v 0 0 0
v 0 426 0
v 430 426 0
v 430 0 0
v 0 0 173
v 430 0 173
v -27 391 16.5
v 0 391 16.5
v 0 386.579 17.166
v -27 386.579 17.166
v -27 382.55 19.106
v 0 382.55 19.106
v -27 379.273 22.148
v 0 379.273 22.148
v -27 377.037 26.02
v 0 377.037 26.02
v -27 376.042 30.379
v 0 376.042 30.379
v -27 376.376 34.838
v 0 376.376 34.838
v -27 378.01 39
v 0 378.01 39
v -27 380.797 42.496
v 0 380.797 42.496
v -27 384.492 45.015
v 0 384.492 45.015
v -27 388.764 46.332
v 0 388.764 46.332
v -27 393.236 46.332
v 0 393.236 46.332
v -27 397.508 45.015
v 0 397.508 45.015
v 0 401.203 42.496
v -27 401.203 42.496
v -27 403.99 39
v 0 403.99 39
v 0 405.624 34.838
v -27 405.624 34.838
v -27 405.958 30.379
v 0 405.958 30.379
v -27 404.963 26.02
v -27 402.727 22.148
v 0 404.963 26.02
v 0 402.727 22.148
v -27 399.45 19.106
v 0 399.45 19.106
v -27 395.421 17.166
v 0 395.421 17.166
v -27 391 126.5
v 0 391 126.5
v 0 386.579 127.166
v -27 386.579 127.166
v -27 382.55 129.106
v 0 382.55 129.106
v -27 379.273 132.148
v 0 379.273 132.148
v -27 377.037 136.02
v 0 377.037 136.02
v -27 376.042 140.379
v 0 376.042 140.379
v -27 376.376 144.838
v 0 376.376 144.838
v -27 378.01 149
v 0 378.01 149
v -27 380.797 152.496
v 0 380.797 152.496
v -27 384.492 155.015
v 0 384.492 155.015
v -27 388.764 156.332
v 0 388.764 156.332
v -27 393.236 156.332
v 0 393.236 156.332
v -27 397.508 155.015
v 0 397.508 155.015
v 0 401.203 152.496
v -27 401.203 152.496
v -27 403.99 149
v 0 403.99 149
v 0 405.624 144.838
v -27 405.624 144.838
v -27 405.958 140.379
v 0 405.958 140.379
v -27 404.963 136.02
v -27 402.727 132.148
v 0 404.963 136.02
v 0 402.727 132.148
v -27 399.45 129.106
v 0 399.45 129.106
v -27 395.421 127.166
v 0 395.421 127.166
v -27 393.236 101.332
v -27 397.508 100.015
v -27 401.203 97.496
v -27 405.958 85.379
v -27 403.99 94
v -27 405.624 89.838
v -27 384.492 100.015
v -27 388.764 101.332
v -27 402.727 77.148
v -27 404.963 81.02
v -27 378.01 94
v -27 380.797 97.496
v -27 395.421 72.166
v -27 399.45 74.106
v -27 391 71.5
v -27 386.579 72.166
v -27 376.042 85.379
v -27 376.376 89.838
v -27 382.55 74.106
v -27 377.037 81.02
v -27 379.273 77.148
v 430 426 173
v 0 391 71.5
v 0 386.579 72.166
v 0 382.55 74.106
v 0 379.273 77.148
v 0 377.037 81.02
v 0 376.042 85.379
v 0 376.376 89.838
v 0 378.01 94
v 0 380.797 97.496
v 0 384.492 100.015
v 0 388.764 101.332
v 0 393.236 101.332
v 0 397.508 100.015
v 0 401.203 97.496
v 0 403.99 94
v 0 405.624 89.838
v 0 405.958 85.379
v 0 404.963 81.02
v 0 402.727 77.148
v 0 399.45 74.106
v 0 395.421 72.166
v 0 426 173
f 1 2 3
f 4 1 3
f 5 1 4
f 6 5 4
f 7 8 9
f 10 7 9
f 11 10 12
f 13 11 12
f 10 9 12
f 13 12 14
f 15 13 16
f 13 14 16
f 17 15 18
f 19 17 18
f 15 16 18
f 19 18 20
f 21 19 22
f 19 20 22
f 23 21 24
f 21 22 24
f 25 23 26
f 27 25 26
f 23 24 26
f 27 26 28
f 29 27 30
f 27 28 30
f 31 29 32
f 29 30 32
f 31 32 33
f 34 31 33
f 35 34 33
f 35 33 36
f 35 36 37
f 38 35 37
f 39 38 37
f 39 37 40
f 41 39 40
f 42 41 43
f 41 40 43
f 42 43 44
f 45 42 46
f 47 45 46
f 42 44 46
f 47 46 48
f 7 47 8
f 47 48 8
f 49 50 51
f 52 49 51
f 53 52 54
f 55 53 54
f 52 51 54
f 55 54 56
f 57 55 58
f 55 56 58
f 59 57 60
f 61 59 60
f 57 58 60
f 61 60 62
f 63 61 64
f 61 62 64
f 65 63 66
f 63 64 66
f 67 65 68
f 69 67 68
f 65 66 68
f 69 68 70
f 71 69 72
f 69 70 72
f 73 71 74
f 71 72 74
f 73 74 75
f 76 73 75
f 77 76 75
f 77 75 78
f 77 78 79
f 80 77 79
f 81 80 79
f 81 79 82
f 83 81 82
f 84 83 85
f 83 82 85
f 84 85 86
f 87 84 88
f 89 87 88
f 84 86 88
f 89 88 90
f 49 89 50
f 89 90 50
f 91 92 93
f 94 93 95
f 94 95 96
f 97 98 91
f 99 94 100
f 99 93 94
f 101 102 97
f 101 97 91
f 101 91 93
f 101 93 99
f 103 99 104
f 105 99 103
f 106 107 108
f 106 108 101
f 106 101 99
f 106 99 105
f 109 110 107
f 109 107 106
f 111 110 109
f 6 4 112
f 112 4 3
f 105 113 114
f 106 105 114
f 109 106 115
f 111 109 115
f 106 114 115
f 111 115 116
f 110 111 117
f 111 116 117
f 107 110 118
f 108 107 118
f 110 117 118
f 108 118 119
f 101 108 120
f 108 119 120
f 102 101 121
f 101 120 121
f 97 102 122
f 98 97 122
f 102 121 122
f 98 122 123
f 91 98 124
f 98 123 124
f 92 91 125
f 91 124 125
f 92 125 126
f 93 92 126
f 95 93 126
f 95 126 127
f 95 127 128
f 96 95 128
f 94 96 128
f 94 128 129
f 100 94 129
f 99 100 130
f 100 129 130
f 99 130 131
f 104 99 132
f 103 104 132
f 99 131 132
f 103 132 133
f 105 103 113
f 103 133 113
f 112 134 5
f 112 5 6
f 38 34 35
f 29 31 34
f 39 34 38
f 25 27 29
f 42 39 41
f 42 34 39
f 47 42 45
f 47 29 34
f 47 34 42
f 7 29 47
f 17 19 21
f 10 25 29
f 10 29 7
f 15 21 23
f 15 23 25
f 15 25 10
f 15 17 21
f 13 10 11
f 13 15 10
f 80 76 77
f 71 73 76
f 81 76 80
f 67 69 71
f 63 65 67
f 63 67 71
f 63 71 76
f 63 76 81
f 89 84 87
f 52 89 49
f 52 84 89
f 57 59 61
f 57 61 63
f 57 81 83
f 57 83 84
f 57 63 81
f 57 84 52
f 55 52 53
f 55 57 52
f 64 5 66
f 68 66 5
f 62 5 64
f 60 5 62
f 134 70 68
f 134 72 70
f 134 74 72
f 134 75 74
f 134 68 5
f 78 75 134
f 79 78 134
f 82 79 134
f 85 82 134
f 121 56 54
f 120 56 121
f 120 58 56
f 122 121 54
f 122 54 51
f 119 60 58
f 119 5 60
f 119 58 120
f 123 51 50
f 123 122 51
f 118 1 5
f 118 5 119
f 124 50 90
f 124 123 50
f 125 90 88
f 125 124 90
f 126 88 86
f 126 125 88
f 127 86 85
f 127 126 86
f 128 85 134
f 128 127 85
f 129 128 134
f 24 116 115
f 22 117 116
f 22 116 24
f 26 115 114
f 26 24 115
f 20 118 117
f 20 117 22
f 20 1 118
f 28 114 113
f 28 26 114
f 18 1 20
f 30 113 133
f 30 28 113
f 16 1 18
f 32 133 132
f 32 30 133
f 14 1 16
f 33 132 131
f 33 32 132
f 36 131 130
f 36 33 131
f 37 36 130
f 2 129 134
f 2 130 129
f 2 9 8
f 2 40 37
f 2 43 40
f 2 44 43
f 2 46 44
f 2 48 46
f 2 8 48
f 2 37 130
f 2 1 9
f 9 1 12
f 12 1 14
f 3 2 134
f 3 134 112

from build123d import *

# Parameters (mm, degrees)
SKETCH1_W           = 430
SKETCH1_H           = 426
BOSS_EXTRUDE1_DEPTH = 173
SKETCH2_R           = 15
BOSS_EXTRUDE2_DEPTH = 27


with BuildPart() as part:
    # Sketch1 → Boss-Extrude1 (new body)
    with BuildSketch(Plane.XY):
        with Locations((215, 213)):
            Rectangle(SKETCH1_W, SKETCH1_H)
    extrude(amount=BOSS_EXTRUDE1_DEPTH)

    # Sketch2 → Boss-Extrude2 (add)
    with BuildSketch(Plane.ZY):
        with Locations(Location((86.5, 391, 0), (0, 0, 180))):
            Circle(SKETCH2_R)
        with Locations(Location((31.5, 391, 0), (0, 0, 180))):
            Circle(SKETCH2_R)
        with Locations(Location((141.5, 391, 0), (0, 0, 180))):
            Circle(SKETCH2_R)
    extrude(amount=BOSS_EXTRUDE2_DEPTH)


solid = part.part
